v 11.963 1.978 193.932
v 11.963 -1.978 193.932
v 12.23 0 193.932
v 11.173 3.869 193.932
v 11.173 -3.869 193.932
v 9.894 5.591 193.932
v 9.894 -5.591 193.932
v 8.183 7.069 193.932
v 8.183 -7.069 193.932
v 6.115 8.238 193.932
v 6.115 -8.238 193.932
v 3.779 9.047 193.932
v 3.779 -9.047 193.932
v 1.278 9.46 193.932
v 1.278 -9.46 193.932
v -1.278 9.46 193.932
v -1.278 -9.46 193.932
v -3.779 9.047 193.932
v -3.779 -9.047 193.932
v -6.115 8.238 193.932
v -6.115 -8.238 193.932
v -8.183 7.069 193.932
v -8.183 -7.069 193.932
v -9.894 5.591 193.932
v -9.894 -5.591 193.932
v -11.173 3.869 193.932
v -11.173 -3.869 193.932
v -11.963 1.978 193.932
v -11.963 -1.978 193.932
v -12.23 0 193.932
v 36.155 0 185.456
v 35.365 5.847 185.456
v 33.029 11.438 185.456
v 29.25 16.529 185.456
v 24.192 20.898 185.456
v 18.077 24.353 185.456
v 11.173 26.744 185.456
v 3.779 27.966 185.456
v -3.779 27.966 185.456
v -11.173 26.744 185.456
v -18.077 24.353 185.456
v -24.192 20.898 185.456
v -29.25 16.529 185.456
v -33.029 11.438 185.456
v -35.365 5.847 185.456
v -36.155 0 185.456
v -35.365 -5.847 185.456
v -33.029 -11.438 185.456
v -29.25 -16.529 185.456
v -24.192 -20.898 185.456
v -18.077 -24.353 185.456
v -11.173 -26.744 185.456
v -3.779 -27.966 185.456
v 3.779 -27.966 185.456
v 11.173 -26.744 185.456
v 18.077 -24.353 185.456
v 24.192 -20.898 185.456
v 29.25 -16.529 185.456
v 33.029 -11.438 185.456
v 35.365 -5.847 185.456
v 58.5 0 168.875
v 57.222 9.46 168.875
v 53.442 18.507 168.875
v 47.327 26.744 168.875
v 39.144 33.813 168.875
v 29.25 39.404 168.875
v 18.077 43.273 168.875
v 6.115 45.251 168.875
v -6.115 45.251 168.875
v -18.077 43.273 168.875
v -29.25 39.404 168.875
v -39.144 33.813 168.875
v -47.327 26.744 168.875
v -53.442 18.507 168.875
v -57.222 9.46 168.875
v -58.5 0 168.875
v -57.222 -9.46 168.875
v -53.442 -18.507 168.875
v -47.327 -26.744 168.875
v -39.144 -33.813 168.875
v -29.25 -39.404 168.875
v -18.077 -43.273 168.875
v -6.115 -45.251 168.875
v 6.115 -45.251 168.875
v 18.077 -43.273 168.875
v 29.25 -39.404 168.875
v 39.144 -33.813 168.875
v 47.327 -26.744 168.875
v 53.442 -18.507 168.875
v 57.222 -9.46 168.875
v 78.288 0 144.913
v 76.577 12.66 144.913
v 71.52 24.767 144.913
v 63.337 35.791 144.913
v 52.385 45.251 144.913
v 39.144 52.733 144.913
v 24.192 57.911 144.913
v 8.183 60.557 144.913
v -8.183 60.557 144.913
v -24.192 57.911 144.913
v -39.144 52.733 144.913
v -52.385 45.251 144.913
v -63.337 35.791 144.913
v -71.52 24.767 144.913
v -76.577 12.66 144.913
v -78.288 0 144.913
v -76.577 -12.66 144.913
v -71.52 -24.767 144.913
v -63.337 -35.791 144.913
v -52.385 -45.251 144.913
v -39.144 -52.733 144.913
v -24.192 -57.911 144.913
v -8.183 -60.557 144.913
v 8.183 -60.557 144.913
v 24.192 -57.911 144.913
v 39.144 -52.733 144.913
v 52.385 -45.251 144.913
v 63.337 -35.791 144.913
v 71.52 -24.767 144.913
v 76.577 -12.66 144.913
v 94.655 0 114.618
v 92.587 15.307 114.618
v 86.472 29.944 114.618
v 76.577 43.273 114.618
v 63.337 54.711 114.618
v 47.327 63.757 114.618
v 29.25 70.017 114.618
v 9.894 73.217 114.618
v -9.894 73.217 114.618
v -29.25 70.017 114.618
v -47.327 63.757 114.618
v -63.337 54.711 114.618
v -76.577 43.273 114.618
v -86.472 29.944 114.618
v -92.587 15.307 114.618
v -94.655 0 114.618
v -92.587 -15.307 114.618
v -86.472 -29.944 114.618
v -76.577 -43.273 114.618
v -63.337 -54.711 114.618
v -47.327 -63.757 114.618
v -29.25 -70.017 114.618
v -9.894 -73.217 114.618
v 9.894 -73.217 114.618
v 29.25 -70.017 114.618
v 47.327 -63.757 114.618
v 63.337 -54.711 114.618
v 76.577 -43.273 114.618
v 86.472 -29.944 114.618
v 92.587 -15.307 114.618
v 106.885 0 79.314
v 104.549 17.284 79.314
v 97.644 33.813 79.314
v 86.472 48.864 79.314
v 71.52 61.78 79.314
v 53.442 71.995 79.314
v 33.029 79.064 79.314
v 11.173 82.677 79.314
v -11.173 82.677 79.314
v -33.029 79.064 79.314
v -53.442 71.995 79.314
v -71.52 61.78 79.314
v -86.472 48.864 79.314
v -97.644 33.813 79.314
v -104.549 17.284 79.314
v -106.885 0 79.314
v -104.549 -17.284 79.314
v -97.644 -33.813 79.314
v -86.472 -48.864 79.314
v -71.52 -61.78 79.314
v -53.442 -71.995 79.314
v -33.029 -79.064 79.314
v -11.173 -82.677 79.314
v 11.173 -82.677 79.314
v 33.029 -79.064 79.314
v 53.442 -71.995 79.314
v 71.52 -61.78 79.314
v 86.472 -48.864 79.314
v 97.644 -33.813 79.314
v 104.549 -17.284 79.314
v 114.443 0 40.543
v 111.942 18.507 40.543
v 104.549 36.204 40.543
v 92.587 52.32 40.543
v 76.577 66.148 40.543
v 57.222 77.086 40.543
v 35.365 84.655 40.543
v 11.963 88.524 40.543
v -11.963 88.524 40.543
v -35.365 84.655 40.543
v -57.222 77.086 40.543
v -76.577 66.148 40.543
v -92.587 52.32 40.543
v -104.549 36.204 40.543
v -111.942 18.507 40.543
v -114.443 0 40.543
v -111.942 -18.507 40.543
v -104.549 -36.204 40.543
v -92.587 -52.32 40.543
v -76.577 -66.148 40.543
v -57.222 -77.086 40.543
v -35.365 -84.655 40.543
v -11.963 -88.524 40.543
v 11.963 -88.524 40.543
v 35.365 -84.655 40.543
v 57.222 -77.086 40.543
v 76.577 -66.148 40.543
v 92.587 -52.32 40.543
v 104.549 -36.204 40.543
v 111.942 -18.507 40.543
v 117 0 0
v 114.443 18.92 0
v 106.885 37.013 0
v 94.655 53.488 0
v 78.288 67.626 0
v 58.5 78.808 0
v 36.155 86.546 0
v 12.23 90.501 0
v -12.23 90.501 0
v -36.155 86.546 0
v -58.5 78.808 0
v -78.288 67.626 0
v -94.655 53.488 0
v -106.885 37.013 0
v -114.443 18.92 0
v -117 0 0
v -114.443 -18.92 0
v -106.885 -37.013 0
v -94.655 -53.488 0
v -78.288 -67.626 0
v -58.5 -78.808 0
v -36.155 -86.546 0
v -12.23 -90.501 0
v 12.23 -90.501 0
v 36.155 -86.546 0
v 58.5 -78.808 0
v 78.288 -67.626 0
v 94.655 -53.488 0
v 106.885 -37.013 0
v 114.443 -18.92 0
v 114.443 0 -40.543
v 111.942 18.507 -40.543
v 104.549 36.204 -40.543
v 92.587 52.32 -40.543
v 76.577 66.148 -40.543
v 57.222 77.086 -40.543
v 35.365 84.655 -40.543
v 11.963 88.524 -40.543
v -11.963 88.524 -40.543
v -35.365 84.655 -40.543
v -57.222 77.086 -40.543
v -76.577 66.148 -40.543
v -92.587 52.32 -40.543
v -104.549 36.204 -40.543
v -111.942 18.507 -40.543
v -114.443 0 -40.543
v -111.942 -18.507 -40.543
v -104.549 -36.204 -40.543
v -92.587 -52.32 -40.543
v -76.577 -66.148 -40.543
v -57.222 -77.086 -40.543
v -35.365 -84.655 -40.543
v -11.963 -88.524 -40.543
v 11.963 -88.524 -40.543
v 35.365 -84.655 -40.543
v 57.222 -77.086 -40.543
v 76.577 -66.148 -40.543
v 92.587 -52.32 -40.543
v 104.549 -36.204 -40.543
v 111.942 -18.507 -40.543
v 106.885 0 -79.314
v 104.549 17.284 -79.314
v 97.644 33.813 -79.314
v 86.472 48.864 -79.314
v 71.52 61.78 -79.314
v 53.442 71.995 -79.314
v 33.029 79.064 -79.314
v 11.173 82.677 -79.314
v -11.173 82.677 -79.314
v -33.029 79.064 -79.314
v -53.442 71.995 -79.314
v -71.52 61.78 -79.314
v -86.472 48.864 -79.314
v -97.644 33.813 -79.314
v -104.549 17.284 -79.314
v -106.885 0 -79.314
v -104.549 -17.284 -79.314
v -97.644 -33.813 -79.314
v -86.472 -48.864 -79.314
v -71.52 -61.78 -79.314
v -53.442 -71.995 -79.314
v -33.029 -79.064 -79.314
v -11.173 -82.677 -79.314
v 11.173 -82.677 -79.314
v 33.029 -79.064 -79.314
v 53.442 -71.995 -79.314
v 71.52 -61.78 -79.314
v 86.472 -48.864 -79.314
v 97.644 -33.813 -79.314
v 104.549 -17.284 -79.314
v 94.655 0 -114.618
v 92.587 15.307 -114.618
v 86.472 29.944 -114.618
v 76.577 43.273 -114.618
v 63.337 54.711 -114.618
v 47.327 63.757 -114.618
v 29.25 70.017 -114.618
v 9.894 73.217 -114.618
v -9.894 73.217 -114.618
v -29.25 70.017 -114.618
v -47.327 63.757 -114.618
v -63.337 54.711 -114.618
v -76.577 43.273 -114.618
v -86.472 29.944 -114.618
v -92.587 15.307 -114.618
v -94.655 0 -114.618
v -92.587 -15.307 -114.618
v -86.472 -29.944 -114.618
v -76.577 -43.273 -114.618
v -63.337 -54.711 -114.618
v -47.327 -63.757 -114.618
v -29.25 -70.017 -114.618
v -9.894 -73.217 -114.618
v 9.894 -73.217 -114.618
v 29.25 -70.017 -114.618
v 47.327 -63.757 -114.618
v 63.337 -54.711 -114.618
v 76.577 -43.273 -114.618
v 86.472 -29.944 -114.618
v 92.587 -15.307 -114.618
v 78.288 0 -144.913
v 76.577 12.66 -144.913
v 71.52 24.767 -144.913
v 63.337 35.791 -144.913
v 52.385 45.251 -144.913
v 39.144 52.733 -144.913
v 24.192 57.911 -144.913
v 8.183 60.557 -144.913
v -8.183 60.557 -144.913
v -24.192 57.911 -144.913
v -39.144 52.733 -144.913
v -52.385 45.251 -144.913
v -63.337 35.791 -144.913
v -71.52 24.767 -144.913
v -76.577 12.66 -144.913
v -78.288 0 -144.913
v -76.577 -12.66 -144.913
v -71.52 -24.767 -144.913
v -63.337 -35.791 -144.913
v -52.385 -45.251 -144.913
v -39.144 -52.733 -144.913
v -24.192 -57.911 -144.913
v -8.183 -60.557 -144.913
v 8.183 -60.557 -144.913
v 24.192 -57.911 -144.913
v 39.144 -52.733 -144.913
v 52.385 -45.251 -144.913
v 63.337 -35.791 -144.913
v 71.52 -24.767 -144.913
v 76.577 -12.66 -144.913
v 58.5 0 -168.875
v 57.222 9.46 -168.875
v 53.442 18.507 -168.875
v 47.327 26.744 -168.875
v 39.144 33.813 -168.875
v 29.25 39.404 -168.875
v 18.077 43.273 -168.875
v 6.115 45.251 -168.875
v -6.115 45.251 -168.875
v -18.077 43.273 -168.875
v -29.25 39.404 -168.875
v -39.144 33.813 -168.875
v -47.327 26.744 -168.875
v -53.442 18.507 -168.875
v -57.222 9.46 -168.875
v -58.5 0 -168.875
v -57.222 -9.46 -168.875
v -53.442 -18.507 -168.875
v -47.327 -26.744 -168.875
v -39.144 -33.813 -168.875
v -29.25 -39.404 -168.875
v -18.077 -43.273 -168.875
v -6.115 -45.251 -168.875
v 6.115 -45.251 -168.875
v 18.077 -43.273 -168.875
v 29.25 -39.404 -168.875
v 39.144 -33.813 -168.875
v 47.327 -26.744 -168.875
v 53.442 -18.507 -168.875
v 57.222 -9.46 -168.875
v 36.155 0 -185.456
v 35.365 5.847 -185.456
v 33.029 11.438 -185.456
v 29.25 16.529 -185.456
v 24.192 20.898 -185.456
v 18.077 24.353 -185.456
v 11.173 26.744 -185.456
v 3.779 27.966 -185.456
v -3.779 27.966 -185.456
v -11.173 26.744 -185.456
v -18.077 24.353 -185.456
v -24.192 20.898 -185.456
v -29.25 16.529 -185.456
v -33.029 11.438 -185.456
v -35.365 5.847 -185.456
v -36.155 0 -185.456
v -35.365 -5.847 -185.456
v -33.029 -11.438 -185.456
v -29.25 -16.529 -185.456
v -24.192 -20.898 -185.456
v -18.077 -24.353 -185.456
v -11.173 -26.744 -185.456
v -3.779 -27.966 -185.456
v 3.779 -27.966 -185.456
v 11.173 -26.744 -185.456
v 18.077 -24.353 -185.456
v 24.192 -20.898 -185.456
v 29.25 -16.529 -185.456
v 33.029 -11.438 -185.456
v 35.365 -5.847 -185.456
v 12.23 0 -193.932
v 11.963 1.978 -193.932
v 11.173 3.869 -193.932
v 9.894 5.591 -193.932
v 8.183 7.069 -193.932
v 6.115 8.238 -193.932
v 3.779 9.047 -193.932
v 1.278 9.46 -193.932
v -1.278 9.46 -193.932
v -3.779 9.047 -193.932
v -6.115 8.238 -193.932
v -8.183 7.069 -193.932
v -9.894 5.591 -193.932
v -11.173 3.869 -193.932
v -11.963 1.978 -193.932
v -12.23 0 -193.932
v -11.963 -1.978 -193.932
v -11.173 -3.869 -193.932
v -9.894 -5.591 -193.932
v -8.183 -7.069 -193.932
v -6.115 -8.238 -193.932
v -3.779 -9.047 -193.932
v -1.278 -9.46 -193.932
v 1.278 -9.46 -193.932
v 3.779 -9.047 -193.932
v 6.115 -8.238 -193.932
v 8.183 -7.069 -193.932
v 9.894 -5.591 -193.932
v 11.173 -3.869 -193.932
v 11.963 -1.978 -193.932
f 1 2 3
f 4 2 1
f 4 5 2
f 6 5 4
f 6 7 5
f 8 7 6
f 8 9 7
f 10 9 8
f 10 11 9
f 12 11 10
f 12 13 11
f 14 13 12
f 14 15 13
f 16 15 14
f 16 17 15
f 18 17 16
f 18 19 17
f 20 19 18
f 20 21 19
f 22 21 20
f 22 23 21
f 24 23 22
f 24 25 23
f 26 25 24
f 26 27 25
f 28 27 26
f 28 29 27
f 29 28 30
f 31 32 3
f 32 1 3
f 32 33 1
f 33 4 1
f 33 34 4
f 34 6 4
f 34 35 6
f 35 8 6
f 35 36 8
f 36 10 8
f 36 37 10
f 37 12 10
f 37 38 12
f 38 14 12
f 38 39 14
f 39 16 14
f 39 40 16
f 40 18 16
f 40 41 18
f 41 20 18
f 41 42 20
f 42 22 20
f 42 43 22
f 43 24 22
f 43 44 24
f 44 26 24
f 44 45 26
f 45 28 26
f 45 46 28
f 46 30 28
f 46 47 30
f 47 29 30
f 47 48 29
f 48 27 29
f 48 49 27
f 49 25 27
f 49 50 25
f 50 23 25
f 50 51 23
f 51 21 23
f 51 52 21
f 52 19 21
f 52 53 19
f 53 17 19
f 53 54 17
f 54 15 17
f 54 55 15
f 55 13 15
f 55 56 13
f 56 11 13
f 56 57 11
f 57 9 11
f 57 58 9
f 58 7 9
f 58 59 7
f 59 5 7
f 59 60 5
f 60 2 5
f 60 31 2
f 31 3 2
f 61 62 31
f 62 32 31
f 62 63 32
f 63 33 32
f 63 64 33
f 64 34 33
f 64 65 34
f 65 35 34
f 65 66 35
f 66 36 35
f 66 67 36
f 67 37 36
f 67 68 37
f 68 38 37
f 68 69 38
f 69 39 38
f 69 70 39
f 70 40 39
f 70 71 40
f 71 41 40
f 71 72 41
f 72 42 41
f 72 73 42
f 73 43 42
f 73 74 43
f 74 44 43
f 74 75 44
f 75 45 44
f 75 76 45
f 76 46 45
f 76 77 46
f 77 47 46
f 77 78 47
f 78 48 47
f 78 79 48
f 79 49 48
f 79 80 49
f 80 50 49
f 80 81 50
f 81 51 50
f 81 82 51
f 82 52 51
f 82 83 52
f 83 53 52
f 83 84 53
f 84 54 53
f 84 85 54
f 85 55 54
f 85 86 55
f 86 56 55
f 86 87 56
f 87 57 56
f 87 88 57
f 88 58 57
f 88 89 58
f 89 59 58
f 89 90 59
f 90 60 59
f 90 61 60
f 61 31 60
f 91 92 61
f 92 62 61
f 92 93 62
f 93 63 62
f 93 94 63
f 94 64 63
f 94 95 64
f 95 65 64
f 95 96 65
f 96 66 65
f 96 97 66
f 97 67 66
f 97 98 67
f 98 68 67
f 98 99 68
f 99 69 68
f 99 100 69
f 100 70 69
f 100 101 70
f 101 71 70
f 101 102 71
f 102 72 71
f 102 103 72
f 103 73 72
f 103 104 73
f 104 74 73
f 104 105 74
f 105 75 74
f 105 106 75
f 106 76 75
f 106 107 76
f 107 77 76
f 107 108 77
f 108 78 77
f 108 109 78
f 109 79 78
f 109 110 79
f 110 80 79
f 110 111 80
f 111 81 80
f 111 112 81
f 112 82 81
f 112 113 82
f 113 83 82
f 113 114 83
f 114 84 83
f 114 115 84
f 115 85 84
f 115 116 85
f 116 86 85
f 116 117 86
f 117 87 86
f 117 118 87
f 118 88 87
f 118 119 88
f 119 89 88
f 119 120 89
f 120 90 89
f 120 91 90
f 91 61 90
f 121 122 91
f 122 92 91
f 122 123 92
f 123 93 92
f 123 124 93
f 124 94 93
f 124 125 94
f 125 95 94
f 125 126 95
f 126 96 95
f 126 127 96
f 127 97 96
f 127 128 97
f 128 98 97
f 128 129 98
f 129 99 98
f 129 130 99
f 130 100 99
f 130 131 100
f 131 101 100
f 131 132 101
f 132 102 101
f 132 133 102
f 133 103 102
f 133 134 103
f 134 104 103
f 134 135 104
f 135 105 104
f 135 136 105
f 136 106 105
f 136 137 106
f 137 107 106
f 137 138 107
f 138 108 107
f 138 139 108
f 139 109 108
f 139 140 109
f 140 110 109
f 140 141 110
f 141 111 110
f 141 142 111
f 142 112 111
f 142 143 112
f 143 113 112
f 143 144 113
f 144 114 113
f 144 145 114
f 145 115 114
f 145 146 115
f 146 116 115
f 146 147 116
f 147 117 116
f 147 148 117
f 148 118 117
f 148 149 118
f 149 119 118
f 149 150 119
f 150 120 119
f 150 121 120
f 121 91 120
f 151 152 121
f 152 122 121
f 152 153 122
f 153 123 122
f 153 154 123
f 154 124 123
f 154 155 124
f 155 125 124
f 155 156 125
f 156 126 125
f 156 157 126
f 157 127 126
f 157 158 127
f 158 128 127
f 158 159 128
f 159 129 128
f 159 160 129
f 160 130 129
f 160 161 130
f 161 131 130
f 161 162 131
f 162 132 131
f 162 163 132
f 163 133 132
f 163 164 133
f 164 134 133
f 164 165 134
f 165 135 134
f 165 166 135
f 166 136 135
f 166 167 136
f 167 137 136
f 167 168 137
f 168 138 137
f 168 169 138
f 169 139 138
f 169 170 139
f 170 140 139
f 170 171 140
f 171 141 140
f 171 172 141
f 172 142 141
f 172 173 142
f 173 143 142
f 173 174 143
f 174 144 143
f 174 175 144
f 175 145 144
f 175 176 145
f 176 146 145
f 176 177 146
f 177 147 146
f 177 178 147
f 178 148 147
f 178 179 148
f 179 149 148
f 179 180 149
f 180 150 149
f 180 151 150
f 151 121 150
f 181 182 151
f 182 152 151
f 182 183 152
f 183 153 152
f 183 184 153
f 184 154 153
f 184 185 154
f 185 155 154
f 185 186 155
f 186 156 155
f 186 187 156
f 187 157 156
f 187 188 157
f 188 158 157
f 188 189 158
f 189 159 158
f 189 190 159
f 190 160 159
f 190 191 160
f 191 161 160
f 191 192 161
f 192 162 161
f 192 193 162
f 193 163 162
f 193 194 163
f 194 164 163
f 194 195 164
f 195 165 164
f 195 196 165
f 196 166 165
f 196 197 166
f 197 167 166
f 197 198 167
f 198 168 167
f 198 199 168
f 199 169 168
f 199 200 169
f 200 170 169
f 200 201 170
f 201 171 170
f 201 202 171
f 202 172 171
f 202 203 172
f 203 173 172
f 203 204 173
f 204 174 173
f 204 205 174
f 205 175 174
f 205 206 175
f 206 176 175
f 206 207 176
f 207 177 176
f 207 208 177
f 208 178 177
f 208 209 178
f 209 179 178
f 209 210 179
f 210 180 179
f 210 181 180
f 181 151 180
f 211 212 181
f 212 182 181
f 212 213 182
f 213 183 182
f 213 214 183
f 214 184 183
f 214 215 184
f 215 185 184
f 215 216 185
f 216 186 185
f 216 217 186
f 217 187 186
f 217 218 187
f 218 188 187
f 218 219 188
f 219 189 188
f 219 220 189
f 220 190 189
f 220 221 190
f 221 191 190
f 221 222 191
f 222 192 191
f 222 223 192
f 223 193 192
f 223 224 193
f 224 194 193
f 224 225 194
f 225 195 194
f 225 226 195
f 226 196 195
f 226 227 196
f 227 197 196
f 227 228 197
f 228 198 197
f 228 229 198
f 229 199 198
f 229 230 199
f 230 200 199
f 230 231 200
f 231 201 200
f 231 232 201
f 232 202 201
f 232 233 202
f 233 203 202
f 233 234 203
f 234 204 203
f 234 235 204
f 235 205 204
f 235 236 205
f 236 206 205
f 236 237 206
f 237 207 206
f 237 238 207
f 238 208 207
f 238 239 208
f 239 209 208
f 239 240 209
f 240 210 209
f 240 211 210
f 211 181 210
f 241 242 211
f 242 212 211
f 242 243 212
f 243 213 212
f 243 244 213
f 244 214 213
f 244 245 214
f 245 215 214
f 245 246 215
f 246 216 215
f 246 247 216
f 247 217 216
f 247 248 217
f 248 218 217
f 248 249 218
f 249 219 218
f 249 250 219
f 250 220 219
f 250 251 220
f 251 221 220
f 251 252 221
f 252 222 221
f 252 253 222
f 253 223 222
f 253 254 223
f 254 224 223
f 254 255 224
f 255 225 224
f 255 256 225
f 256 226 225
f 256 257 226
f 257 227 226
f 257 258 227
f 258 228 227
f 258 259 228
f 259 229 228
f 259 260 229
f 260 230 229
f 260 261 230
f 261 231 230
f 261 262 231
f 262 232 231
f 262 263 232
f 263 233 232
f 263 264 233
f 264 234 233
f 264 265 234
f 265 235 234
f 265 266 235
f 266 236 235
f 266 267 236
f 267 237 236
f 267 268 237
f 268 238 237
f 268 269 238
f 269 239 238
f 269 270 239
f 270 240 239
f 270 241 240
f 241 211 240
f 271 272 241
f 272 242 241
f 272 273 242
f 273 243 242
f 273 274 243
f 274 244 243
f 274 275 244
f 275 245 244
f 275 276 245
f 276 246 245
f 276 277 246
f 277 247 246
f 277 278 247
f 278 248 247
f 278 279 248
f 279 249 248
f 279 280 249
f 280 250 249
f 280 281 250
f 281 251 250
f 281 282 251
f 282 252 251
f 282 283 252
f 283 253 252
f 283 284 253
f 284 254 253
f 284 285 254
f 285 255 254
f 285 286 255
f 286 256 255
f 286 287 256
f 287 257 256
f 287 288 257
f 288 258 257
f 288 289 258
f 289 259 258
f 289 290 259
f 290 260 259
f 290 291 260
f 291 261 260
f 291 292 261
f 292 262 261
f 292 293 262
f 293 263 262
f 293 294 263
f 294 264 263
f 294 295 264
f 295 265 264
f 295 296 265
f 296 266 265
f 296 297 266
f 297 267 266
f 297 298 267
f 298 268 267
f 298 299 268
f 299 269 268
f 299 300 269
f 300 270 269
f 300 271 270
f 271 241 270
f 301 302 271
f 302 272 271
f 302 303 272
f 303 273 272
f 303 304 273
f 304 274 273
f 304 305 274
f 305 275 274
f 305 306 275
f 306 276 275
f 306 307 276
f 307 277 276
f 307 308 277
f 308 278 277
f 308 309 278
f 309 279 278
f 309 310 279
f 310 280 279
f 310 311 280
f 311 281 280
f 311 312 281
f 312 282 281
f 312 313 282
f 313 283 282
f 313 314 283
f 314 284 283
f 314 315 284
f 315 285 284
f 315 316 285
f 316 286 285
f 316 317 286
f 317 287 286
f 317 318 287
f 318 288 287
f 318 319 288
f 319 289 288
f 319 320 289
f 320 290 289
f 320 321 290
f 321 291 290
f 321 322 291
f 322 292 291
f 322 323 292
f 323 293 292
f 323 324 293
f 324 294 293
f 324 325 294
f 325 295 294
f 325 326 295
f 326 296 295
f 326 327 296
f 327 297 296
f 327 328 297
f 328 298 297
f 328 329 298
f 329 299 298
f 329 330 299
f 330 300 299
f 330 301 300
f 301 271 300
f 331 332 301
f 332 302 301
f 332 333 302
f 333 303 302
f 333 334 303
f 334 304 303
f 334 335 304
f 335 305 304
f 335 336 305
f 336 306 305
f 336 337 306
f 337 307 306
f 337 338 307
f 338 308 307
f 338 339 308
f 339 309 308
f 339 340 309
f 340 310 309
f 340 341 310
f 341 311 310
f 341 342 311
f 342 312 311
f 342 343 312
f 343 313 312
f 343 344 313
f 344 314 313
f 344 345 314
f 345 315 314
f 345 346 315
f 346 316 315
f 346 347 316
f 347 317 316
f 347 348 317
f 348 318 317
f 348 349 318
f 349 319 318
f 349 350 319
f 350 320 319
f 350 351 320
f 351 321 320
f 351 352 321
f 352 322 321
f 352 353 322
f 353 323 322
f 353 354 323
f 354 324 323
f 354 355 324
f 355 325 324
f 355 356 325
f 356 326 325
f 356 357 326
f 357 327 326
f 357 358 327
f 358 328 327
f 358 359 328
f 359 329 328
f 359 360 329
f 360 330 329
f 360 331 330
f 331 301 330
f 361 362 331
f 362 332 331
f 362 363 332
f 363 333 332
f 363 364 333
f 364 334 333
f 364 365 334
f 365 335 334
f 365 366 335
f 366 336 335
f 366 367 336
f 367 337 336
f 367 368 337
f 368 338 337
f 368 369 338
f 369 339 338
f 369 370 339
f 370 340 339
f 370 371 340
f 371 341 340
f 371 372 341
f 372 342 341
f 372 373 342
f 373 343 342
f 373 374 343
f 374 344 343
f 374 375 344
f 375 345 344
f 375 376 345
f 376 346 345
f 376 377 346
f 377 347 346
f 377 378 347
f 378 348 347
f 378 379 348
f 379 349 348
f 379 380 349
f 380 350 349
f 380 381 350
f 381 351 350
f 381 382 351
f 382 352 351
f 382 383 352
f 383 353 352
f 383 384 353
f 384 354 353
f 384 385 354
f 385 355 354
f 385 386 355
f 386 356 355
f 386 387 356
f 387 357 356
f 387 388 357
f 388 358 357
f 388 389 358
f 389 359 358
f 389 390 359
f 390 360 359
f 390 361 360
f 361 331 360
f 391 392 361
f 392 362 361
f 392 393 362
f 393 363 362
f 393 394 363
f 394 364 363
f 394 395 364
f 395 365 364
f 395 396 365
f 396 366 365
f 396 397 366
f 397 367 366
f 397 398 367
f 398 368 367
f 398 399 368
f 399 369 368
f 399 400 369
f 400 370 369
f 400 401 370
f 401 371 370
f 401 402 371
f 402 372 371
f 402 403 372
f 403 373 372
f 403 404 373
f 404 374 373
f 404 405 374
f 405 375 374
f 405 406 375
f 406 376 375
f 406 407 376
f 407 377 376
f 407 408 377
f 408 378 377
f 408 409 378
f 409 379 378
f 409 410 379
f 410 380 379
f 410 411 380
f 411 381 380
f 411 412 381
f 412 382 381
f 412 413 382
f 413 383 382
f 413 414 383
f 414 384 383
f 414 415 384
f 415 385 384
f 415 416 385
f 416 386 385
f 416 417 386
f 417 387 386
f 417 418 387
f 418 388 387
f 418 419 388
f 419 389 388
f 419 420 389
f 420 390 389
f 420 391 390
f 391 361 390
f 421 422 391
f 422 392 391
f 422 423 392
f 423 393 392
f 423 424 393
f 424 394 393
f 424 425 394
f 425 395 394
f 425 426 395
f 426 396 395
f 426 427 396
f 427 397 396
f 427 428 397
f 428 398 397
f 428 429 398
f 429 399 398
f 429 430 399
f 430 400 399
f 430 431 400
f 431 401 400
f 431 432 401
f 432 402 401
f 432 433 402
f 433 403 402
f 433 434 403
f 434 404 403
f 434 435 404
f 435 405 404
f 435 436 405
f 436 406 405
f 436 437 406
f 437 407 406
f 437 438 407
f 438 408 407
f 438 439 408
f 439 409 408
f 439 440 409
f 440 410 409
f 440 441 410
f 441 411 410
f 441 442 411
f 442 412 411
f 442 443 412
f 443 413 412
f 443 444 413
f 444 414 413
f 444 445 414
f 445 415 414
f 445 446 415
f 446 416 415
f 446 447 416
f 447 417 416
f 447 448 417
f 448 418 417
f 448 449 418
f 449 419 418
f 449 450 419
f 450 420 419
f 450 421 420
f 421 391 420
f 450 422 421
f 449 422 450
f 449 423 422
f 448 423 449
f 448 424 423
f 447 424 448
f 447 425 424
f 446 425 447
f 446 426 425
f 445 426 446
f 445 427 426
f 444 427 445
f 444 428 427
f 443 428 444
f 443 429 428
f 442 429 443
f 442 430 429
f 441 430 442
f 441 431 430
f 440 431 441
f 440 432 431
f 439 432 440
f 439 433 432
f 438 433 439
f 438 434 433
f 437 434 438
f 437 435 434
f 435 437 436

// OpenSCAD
// Generated by SolidPython 1.0.1 on 2020-07-29 00:46:48


scale(v = [9, 7, 15]) {
	sphere(r = 13);
}
/***********************************************
*********      SolidPython code:      **********
************************************************
 
# import packages: SolidPython
from solid import *
from solid.utils import *
from itertools import chain, combinations, permutations


class Resize:

    def __init__(self, scad_file):
        self.scad_file = scad_file
        #self.scad_file = import_scad(scad_file)
        # cone/cylinder param:
        self.r1 = 0
        self.r2 = 0
        self.h = 0
        # rectangular prism param:
        self.w = 0
        self.l = 0
        # ellipse param:
        self.r = 0

    # import OpenScad code (file name corresponds to shape)


    # classify shape + parameters
    def assign(self, param1, param2, param3):
        if self.scad_file == 'cone.scad':
            self.r1 = param1
            self.r2 = param2
            self.h = param3
        elif self.scad_file == 'cylinder.scad':
            self.r1 = param1
            self.r2 = param2
            self.h = param3
        elif self.scad_file == 'rectangularPrism.scad':
            self.h = param1
            self.l = param2
            self.w = param3
        else:
            self.r = param1
            self.h = param2

    # resize parameters
    def iterate(self):
        x = range(3, 20, 2)
        i = 1
        if self.scad_file == 'cone.scad':
            tempList = list(permutations(x, 2))
            for temp in tempList:
                param1 = temp[0]
                param2 = temp[1]
                filepath = 'produced_scad_files/' + 'cone' + str(param1) + '_' + str(param2) + '_' + '.scad'
                scad_render_to_file(cylinder(h=param1, r1=param2, r2=0), filepath)

        elif self.scad_file == 'cylinder.scad':
            tempList = list(permutations(x, 3))
            for temp in tempList:
                param1 = temp[0]
                param2 = temp[1]
                filepath = 'produced_scad_files/' + 'cylinder' + str(param1) + '_' + str(param2) + '_' + '.scad'
                scad_render_to_file(cylinder(h=param1, r1=param2, r2=param2), filepath)

        elif self.scad_file == 'rectangularPrism.scad':
            tempList = list(permutations(x, 3))
            for temp in tempList:
                param1 = temp[0]
                param2 = temp[1]
                param3 = temp[2]
                filepath = 'produced_scad_files/' + 'rectangularPrism' + str(param1) + '_' + str(param2) + '_' + str(
                    param3) + '.scad'
                scad_render_to_file(cube(size=(param1, param2, param3)), filepath)

        elif self.scad_file == 'ellipse.scad':
            tempList = list(permutations(x, 4))
            for temp in tempList:
                param1 = temp[0]
                param2 = temp[1]
                param3 = temp[2]
                param4 = temp[3]
                filepath = 'produced_scad_files/' + 'ellipse' + str(param1) + '_' + str(param2) + '_' + str(param3) + '_' + str(param4) + '.scad'
                scad_render_to_file(scale([param1, param2, param3])(sphere(r=param4)), filepath)

    def render_to_scadfile(self):
        scad_render_to_file(scad, 'example.scad') 
 
************************************************/
